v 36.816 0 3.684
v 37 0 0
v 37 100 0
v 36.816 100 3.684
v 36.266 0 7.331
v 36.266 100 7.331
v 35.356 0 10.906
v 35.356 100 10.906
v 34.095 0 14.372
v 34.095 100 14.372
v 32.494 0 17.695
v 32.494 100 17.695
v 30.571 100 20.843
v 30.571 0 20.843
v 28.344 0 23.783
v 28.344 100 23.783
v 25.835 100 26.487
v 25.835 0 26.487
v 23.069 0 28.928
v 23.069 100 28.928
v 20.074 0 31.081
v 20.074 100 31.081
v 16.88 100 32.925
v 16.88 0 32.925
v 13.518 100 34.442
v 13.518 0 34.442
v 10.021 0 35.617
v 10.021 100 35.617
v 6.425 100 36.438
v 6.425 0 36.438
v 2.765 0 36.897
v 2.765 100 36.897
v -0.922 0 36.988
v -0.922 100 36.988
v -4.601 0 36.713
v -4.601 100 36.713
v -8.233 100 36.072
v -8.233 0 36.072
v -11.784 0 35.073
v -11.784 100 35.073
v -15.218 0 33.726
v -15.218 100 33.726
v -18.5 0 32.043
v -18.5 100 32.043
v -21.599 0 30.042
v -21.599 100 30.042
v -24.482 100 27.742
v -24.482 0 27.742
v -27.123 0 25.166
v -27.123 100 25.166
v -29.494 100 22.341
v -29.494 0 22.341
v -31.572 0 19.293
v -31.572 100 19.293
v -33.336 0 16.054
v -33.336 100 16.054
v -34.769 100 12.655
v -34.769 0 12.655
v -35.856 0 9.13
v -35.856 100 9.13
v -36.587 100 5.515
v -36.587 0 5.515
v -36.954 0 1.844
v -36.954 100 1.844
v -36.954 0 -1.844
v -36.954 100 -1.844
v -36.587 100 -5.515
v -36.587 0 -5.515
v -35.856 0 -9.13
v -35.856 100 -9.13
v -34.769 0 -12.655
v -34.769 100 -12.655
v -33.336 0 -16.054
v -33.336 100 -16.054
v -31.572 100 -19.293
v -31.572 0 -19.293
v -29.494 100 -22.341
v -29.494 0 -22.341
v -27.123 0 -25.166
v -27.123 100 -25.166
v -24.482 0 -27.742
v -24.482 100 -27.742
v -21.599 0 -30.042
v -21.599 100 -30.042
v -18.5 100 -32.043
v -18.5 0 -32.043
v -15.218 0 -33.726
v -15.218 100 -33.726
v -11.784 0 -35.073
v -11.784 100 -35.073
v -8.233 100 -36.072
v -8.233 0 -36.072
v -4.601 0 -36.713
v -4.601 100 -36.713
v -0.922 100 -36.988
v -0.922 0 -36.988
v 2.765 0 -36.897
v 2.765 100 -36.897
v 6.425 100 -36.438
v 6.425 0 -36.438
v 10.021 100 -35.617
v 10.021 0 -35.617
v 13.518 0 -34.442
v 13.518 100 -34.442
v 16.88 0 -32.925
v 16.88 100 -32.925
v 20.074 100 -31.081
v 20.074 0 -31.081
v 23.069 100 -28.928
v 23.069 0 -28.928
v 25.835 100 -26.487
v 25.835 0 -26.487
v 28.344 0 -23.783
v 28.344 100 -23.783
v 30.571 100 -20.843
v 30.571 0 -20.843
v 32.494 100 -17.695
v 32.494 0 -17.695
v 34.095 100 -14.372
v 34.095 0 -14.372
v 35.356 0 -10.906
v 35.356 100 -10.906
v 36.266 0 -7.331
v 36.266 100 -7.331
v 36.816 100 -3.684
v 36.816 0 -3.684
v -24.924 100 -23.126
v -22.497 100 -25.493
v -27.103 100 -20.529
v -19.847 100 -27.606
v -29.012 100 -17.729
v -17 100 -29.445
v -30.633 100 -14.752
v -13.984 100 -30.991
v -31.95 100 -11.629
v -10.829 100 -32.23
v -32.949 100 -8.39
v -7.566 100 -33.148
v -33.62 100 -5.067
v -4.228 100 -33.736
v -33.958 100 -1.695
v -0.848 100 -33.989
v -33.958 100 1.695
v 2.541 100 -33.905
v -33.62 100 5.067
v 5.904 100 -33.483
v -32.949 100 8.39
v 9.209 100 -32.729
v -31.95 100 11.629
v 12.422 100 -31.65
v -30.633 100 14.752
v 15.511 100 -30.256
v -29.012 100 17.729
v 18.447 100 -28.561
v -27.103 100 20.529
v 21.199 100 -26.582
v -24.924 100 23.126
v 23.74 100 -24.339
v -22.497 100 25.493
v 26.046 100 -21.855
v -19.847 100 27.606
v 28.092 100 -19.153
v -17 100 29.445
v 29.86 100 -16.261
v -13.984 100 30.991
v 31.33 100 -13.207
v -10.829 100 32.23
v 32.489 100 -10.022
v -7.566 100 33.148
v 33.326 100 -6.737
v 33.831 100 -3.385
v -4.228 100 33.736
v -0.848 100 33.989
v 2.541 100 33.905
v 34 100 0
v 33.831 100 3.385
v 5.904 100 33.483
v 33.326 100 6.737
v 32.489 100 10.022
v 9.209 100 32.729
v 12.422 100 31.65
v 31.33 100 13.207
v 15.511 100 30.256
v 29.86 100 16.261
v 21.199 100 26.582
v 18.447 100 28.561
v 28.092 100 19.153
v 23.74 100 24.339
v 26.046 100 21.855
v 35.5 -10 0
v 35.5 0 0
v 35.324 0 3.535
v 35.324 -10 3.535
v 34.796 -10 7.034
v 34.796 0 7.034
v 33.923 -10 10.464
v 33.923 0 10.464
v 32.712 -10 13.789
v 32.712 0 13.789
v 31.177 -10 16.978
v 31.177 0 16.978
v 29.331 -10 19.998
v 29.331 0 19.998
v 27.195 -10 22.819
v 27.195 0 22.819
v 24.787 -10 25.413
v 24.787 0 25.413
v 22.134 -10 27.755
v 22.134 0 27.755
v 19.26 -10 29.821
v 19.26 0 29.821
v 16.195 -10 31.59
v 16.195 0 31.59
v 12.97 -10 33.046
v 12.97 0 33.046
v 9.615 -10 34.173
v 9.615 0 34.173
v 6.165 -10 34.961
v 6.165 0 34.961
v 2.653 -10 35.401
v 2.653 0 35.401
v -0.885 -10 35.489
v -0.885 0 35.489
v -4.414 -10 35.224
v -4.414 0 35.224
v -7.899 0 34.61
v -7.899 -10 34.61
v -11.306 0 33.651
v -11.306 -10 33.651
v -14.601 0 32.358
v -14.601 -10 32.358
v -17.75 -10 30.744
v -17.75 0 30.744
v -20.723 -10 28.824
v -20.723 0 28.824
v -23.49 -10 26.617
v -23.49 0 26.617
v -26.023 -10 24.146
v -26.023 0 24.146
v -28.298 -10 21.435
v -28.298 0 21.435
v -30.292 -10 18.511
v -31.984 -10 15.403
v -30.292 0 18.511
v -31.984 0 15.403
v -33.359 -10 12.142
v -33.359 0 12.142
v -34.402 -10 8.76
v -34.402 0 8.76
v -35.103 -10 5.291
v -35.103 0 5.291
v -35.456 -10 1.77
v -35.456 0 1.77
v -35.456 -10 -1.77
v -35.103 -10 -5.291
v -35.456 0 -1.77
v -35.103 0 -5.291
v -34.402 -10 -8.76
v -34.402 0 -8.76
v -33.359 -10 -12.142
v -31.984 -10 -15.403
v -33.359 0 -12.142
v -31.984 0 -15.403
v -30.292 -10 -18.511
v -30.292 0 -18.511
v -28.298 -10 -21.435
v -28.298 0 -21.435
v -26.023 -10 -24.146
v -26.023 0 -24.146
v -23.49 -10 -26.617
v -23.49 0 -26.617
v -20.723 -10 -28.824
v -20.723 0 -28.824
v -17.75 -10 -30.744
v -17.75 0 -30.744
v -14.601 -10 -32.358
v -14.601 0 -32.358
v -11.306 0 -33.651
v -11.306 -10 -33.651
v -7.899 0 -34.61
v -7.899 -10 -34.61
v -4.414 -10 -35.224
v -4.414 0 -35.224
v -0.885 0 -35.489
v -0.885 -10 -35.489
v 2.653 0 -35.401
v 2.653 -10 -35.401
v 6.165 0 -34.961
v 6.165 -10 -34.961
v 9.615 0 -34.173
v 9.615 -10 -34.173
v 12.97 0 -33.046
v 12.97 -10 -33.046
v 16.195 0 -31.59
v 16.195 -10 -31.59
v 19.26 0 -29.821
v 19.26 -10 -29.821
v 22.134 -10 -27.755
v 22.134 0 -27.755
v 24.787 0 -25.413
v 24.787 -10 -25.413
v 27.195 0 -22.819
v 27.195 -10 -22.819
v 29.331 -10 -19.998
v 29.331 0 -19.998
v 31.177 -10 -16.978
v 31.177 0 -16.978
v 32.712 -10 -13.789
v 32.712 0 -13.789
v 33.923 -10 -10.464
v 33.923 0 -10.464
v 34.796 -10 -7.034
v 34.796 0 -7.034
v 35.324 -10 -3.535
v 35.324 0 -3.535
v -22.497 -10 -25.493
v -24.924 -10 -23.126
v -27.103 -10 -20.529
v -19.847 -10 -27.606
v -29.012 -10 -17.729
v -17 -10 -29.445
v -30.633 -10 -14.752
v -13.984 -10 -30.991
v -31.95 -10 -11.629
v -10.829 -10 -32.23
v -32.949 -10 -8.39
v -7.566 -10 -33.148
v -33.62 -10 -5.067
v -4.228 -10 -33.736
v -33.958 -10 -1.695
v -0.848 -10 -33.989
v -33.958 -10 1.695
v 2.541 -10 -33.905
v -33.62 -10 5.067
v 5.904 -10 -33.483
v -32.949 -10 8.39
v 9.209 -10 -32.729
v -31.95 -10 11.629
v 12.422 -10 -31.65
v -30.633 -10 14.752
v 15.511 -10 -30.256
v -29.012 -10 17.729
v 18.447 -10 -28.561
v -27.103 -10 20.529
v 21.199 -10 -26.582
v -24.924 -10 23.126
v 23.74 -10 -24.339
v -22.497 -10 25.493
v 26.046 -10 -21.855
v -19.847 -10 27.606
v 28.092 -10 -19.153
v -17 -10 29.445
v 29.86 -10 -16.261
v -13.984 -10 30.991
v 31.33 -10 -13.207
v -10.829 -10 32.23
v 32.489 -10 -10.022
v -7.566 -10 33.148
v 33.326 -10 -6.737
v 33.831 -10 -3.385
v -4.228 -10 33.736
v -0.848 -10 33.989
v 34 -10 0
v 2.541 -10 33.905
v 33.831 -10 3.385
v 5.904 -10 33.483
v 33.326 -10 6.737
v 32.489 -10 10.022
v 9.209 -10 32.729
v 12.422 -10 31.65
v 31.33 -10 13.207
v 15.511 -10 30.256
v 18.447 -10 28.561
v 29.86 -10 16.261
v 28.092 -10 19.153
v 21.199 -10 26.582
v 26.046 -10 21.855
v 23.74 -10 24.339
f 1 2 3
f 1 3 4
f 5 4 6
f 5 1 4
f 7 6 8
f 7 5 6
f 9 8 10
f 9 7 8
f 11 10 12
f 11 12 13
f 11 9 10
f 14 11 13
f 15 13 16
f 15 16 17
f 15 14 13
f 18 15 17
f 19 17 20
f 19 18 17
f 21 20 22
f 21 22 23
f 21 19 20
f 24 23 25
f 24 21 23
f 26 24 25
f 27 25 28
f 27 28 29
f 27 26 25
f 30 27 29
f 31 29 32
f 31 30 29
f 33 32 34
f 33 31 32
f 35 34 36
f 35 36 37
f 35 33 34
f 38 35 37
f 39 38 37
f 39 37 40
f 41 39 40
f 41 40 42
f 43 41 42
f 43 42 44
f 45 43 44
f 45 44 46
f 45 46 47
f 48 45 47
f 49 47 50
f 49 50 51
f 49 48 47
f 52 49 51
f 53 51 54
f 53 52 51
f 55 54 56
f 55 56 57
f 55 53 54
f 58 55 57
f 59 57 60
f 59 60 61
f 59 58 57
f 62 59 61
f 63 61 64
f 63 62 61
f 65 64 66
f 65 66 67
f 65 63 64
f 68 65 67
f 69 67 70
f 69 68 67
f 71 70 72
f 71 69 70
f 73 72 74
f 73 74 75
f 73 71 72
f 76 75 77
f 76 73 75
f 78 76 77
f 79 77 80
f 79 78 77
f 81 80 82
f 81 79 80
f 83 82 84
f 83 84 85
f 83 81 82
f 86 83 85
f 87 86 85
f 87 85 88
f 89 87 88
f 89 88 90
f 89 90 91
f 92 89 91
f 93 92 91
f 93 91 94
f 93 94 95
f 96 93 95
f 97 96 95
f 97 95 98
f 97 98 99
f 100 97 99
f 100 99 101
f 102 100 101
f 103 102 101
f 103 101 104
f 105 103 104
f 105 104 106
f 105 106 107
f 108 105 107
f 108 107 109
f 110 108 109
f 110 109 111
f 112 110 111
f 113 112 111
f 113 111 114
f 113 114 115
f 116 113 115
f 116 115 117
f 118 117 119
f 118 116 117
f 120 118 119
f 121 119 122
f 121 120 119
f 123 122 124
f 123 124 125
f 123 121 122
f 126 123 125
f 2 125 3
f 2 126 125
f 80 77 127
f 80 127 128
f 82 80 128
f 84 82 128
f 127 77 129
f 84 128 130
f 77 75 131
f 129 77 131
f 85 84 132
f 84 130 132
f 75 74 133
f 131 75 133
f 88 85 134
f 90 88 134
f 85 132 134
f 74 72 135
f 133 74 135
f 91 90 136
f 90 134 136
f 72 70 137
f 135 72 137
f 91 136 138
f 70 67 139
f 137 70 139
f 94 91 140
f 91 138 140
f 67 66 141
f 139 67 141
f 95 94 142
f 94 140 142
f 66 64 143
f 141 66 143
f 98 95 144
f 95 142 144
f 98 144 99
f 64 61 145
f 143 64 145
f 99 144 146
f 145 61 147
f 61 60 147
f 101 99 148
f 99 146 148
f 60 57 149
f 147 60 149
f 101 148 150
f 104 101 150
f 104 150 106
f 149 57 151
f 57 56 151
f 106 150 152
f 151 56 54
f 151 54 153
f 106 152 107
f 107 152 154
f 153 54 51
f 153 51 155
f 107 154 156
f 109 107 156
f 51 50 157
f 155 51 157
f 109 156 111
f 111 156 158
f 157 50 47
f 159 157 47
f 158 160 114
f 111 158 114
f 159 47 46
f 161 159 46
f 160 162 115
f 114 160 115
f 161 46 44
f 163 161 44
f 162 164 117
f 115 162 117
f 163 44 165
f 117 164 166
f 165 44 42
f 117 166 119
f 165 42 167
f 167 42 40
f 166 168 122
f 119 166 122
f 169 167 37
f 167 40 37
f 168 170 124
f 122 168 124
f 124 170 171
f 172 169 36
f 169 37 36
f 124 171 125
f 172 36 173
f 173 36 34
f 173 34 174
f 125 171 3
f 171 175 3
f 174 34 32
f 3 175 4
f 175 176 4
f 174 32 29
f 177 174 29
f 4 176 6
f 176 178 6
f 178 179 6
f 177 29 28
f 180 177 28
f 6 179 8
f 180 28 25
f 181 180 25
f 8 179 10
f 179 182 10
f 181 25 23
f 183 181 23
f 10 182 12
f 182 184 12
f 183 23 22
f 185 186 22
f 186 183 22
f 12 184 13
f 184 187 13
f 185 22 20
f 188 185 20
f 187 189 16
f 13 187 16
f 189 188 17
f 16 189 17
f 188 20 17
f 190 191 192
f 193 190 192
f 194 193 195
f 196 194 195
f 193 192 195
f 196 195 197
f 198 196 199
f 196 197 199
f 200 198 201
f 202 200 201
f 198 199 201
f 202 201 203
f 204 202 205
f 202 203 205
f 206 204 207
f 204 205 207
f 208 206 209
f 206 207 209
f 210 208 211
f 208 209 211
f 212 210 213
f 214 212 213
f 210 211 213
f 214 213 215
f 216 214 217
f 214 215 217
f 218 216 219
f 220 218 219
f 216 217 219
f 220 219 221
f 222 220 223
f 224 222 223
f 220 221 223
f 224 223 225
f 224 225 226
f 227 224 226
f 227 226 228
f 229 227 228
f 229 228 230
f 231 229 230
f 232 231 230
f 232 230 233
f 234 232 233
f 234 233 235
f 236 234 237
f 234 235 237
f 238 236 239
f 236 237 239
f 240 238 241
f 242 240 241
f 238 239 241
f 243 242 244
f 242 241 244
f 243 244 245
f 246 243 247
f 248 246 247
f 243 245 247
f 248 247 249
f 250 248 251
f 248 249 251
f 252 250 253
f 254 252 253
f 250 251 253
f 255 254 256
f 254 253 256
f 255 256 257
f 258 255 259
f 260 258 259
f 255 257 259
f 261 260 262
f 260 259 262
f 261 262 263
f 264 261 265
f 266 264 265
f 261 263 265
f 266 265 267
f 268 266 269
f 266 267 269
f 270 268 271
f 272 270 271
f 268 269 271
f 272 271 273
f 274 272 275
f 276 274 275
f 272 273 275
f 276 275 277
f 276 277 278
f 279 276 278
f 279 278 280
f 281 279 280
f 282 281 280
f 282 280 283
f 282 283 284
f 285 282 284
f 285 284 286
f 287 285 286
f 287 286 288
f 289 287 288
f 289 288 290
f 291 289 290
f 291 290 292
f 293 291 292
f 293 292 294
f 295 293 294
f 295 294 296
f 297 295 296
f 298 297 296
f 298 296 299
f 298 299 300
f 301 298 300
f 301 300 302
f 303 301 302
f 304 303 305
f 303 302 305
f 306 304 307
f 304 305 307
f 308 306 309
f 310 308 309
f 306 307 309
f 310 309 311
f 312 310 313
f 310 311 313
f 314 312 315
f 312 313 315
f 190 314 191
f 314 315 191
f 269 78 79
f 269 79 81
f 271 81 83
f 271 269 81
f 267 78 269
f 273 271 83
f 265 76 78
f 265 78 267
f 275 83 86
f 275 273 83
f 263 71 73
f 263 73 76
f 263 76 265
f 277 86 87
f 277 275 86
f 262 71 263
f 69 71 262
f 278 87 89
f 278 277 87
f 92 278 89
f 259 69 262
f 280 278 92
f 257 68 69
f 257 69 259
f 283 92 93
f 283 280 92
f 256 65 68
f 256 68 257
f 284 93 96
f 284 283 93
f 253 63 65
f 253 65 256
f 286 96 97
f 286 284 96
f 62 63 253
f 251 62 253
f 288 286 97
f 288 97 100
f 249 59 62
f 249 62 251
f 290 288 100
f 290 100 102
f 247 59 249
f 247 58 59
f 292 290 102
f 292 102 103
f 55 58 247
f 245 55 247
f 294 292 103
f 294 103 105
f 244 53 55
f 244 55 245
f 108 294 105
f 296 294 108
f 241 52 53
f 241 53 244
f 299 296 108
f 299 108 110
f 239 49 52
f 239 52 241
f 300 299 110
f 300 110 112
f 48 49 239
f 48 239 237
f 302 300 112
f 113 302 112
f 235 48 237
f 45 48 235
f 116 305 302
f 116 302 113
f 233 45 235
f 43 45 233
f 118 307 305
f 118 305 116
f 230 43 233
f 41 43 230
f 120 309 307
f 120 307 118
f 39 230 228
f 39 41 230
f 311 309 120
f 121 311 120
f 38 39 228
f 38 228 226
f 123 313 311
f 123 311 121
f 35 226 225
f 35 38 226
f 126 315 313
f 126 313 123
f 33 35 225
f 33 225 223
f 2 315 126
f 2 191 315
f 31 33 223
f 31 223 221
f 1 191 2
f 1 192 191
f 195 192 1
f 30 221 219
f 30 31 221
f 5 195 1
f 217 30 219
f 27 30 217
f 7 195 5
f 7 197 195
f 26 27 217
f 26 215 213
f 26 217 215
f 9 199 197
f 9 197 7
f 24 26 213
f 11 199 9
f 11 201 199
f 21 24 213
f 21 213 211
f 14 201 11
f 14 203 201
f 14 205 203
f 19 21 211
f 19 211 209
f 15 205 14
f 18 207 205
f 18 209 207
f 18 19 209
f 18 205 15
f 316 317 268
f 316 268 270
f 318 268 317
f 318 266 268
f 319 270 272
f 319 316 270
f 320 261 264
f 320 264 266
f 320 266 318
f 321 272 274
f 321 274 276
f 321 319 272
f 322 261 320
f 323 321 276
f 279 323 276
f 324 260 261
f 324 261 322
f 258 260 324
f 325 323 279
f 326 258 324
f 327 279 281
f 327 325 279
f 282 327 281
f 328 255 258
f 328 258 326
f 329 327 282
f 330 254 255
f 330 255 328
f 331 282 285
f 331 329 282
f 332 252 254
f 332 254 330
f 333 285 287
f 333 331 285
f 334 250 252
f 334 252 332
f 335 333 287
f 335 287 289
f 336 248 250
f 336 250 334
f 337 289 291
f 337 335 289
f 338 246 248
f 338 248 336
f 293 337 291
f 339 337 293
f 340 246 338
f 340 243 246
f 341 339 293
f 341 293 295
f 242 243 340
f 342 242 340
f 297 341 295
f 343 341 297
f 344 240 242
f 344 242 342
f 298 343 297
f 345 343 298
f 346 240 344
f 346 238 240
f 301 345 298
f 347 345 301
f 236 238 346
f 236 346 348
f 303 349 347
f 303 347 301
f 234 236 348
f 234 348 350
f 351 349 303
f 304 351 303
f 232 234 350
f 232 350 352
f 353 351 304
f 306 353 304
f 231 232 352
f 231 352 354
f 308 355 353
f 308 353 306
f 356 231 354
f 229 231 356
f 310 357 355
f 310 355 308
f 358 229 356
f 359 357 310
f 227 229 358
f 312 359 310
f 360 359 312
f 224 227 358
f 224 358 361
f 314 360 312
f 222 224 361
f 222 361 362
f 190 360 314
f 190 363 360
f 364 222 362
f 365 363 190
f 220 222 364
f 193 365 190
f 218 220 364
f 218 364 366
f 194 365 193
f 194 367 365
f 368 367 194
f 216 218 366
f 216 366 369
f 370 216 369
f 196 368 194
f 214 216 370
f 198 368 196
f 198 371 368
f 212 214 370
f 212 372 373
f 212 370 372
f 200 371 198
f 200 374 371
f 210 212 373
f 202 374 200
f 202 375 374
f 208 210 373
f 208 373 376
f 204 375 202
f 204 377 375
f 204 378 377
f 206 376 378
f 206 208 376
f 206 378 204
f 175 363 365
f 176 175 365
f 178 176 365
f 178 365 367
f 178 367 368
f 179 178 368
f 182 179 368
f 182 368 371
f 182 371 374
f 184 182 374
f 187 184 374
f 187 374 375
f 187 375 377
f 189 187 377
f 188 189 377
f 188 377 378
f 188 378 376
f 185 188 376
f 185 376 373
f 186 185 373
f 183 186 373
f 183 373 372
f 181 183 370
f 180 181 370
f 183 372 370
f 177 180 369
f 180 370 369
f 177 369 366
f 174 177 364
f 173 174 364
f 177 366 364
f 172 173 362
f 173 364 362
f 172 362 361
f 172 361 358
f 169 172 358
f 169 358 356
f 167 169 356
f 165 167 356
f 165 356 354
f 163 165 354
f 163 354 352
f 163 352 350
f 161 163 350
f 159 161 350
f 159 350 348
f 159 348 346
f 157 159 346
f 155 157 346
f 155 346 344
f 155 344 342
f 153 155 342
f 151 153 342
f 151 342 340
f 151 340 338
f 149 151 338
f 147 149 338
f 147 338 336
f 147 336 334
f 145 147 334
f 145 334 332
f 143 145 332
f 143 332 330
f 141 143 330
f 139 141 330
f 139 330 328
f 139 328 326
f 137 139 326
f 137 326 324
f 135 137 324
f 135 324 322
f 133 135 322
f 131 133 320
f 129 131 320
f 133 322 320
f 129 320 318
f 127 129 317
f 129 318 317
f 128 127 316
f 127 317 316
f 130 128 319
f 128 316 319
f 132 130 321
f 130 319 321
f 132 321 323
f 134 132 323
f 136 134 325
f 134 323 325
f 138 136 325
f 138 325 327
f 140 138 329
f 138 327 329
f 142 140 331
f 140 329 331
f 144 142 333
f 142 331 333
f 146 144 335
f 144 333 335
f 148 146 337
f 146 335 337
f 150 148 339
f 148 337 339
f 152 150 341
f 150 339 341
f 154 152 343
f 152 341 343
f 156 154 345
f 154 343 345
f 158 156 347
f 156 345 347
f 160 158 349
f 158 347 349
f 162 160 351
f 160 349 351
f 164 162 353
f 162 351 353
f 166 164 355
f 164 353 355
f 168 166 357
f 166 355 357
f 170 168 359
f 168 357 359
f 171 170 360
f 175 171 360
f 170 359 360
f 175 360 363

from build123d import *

# Parameters (mm, degrees)
F0_R     = 37
F0_R_2   = 34
F1_DEPTH = 100
F2_R     = 35.5
F3_DEPTH = 10
F4_R     = 34
F5_DEPTH = 25


with BuildPart() as f1:
    # F0 (on Front) → F1 (new body)
    with BuildSketch(Plane.XZ):
        Circle(F0_R)
        Circle(F0_R_2, mode=Mode.SUBTRACT)
    extrude(amount=-F1_DEPTH)

    # F2 (on Front) → F3 (join)
    with BuildSketch(Plane.XZ):
        Circle(F2_R)
    extrude(amount=F3_DEPTH)

    # F4 (on face) → F5 (cut)
    with BuildSketch(Plane.XZ.offset(10)):
        Circle(F4_R)
    extrude(amount=-F5_DEPTH, mode=Mode.SUBTRACT)


solid = f1.part
